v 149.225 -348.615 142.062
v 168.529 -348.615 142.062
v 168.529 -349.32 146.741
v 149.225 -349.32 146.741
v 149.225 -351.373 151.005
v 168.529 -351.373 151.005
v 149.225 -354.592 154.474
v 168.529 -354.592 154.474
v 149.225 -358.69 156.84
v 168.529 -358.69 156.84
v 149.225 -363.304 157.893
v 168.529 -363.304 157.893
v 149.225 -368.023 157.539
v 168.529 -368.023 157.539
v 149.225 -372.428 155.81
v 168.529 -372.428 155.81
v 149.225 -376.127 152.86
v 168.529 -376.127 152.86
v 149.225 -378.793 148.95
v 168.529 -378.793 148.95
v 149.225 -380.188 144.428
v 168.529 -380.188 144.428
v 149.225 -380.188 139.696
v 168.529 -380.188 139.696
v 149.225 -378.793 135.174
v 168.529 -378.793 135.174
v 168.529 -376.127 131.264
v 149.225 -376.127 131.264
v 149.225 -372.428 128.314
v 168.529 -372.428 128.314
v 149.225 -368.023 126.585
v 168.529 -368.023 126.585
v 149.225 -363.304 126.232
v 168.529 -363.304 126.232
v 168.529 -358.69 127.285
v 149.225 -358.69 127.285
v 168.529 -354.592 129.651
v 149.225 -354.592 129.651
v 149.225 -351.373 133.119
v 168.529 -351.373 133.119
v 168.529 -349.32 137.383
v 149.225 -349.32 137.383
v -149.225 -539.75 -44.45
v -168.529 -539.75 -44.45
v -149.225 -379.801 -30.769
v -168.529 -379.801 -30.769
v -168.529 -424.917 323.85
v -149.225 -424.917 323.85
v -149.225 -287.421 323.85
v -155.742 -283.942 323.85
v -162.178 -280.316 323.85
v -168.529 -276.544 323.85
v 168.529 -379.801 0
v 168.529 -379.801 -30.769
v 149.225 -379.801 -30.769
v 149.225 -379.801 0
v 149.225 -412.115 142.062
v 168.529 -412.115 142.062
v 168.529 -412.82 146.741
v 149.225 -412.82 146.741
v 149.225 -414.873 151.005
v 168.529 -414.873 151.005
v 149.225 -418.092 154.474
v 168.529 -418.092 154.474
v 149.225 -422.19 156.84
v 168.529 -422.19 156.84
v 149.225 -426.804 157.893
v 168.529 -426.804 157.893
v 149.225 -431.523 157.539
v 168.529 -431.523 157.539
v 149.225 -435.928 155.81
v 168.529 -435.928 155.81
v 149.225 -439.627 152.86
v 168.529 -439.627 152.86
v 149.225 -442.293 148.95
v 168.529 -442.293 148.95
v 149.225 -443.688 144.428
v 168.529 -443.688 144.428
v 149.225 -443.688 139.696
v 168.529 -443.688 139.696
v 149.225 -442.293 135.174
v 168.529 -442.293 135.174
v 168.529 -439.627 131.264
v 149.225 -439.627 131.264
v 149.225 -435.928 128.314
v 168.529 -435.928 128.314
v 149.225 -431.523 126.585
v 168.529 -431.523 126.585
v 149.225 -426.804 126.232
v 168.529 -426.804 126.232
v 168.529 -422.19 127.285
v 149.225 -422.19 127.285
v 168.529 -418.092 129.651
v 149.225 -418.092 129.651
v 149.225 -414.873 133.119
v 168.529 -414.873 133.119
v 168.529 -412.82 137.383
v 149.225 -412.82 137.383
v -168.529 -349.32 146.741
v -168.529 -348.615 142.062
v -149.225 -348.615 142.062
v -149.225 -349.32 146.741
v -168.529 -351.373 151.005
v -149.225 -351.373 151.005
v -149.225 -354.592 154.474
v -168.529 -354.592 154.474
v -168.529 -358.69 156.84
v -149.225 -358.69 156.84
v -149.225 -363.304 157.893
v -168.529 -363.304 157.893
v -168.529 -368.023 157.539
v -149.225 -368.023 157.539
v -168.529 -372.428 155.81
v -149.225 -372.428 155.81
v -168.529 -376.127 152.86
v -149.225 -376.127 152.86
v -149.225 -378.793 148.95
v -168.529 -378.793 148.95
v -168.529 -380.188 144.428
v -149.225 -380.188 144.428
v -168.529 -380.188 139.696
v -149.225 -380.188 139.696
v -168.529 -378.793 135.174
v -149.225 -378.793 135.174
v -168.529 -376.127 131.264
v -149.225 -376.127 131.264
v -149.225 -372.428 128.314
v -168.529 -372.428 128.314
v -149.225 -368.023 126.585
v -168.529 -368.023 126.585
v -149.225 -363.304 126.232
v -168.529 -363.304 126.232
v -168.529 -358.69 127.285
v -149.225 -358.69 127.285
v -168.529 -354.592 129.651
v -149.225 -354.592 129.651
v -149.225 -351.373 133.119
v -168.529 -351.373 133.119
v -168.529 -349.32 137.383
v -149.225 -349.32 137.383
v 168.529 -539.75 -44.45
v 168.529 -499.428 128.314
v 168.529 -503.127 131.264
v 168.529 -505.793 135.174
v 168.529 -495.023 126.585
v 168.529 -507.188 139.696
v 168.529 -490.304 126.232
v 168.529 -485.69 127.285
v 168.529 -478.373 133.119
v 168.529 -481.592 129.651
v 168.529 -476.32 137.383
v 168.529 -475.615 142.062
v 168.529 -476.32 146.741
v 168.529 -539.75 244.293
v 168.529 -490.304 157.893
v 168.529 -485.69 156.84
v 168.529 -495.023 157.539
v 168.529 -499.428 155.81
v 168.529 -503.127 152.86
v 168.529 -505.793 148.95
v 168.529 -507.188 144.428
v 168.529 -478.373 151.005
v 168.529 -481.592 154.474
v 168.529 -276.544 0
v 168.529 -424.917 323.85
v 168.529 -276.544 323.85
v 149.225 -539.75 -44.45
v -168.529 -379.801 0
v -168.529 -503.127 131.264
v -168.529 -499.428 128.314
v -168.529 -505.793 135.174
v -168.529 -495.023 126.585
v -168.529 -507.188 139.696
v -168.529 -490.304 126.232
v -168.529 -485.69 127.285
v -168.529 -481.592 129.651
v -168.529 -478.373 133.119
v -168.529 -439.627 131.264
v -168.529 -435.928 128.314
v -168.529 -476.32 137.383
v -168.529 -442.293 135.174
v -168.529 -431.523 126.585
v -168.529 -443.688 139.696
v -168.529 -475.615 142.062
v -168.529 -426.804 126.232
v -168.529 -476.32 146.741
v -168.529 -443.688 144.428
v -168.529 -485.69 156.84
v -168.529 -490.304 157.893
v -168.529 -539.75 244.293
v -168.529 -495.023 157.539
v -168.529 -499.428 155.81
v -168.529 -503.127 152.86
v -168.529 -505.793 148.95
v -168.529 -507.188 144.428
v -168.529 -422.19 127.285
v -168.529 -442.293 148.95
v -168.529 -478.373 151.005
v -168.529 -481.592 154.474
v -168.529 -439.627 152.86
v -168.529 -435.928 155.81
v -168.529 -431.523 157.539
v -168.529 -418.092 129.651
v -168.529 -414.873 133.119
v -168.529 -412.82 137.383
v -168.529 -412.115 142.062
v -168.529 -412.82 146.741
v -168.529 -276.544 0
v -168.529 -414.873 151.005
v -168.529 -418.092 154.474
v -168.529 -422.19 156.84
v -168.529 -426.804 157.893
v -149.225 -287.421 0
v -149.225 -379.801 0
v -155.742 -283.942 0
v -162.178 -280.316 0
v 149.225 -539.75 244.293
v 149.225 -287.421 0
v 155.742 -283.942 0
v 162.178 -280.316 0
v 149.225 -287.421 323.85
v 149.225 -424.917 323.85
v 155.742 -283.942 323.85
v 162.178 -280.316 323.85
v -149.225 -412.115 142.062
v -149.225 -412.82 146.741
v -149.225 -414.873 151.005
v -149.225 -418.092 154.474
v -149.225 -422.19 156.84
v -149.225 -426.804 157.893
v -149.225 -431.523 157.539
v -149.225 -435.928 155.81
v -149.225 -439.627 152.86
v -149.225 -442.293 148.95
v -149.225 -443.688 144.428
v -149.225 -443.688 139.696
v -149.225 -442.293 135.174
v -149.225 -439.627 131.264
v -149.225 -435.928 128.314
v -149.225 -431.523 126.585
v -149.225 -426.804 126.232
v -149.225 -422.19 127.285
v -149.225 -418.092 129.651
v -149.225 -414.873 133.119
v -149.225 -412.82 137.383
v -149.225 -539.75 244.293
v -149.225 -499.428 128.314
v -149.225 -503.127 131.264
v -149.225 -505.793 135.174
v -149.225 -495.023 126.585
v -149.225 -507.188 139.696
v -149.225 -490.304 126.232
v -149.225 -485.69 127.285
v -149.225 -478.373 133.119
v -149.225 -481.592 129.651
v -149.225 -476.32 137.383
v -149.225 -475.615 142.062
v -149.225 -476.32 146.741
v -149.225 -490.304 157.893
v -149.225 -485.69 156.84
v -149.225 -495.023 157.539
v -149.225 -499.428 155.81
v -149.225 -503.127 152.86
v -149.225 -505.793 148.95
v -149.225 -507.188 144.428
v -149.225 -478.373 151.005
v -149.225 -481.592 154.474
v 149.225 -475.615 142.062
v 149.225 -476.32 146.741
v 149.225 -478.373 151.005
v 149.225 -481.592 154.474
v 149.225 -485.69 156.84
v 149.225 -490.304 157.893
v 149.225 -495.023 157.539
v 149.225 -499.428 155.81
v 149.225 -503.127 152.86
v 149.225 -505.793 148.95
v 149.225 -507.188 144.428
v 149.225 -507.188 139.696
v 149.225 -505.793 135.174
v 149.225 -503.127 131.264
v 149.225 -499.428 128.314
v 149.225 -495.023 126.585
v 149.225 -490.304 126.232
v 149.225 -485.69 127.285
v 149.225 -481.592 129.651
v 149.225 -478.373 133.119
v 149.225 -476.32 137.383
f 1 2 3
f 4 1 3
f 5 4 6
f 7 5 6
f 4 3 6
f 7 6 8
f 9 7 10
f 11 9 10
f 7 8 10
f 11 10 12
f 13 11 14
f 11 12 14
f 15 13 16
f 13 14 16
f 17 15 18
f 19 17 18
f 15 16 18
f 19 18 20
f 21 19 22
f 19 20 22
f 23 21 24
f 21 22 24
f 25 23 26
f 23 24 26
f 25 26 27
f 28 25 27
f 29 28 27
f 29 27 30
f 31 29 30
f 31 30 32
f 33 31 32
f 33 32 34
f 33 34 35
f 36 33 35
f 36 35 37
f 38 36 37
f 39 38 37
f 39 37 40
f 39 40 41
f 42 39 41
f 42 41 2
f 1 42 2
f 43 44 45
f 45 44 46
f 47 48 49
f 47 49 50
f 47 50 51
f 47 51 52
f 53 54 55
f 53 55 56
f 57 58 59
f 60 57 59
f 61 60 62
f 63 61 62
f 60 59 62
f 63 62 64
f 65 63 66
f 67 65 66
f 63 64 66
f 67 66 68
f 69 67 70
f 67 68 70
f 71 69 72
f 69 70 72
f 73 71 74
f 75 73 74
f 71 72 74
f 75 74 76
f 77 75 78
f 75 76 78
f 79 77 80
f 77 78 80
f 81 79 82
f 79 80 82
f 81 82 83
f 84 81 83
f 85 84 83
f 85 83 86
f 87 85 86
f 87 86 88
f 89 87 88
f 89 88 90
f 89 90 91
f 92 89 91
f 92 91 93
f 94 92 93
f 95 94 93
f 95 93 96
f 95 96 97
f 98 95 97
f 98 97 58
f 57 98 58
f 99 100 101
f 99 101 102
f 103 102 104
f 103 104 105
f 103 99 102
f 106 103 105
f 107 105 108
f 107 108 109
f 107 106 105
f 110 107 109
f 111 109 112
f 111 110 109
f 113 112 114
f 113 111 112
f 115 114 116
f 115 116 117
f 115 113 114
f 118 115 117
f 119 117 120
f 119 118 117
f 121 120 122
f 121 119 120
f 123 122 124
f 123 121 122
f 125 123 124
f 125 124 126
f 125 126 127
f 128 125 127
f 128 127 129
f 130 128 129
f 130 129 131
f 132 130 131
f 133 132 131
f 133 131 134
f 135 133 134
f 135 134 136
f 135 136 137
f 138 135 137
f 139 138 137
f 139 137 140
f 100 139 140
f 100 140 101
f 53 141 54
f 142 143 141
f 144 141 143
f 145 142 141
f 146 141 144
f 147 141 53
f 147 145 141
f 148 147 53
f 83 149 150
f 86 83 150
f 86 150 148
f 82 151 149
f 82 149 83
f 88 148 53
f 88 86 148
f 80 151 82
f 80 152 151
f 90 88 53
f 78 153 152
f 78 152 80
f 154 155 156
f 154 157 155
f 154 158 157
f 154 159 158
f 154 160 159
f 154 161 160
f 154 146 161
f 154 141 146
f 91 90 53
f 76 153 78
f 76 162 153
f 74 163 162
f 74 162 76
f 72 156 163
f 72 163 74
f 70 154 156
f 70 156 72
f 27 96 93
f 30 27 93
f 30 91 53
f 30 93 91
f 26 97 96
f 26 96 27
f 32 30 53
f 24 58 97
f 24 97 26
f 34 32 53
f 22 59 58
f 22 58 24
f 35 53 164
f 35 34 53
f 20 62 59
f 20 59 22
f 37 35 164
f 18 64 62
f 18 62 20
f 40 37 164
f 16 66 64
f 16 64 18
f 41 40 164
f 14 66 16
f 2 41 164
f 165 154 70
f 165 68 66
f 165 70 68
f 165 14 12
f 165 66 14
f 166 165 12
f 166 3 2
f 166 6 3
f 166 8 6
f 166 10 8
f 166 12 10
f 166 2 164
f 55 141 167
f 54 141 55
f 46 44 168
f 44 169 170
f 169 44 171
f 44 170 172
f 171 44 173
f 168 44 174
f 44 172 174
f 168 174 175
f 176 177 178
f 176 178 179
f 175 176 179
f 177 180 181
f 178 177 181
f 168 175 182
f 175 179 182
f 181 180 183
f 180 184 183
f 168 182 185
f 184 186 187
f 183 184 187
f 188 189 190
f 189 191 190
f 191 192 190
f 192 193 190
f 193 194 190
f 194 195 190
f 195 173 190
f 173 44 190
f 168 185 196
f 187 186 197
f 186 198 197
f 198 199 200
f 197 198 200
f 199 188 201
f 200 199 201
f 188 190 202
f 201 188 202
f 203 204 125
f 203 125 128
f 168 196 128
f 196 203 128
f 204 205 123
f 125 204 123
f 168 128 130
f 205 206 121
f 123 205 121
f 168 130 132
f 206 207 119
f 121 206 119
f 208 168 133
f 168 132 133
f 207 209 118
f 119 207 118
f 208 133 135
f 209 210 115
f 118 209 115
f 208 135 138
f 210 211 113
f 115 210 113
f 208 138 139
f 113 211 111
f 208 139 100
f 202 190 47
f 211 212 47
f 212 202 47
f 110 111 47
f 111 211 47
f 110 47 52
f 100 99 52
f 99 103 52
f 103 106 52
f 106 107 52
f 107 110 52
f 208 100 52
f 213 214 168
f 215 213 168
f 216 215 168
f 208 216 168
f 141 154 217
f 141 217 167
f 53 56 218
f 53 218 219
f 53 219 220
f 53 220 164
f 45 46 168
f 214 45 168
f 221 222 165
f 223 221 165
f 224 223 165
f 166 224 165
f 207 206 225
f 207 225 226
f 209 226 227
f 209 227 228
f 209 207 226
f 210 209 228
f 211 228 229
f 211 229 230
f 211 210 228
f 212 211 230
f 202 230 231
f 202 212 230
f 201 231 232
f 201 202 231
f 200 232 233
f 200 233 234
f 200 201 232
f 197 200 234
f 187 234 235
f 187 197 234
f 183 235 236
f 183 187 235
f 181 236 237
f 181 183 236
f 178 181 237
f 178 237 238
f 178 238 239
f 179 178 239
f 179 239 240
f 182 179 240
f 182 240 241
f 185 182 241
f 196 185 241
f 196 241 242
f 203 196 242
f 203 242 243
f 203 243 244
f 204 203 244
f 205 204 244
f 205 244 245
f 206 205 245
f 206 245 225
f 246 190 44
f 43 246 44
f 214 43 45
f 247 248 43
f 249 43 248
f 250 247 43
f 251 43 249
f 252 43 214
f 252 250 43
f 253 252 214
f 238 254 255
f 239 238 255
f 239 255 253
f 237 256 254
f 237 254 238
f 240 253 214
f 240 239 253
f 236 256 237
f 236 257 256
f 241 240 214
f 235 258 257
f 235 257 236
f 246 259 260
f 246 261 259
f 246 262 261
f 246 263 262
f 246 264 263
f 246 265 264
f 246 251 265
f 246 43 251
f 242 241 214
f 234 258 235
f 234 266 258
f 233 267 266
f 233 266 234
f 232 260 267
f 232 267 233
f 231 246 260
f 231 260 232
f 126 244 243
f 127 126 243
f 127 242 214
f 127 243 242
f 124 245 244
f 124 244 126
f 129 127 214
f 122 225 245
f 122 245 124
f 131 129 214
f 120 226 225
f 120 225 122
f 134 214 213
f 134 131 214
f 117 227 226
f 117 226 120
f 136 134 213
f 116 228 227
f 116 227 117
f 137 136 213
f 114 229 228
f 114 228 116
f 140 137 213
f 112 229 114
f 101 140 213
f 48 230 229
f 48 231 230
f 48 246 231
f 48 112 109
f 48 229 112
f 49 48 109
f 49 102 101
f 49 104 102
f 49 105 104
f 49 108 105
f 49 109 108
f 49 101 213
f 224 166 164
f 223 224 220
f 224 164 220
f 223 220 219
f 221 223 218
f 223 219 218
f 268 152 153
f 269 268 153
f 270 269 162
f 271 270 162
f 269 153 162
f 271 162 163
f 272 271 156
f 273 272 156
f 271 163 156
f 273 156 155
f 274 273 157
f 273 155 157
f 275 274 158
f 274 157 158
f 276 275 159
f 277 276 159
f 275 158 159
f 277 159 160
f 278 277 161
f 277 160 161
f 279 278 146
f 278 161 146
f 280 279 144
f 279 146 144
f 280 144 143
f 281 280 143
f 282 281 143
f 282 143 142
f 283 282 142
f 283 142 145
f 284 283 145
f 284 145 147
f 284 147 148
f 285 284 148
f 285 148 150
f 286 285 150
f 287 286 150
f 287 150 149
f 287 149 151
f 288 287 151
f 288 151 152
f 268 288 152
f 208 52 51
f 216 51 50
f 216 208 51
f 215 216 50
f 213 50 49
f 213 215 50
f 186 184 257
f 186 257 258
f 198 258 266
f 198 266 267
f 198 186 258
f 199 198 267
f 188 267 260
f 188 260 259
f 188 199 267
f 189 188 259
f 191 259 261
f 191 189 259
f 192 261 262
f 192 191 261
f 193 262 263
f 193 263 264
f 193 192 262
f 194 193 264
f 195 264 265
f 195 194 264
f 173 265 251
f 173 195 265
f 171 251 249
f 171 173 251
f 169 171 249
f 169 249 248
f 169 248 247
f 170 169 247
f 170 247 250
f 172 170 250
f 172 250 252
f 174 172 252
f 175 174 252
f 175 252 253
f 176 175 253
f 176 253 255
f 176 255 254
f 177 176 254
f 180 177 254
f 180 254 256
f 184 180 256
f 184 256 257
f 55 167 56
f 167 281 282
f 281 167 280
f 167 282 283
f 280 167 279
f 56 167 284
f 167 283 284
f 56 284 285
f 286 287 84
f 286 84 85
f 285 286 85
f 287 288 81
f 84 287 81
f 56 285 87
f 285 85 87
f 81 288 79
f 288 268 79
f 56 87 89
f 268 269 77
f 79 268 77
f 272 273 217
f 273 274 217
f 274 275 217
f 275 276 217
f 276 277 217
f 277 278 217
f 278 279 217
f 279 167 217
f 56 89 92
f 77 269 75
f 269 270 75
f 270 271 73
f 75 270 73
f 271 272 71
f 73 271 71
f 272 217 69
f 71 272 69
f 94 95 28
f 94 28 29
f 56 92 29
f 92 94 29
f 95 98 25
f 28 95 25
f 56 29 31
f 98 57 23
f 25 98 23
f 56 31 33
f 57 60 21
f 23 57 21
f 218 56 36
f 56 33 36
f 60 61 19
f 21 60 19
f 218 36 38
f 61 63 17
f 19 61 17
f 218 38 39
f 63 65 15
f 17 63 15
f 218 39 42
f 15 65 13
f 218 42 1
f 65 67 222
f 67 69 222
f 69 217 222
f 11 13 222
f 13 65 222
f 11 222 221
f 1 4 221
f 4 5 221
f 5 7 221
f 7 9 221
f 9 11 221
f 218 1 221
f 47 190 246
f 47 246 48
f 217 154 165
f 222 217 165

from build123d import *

# Parameters (mm, degrees)
F1_DEPTH = 323.85
F3_DEPTH = 19.304
F4_R     = 15.875
F5_DEPTH = 83.566


with BuildPart() as f1:
    # F0 (on Top) → F1 (new body)
    with BuildSketch(Plane.XY):
        with BuildLine():
            Line((149.225, -287.42081), (149.225, -539.75))
            Line((149.225, -539.75), (168.529, -539.75))
            Line((168.529, -539.75), (168.529, -276.544388))
            ThreePointArc((168.529, -276.544388), (158.970045, -282.14774), (149.225, -287.42081))
        make_face()
    extrude(amount=F1_DEPTH)

    # F2 (on face) → F3 (join)
    with BuildSketch(Plane.YZ.offset(168.529)):
        Polygon((-379.800558, 0), (-539.75, 0), (-539.75, -44.45), (-379.800558, -30.7687), align=None)
    extrude(amount=-F3_DEPTH)

    # F4 (on face) → F5 (cut)
    with BuildSketch(Plane.YZ.offset(168.529)):
        Polygon((-424.9166, 323.85), (-539.75, 323.85), (-539.75, 244.292598), align=None)
        with Locations((-491.49, 142.0622)):
            Circle(F4_R)
        with Locations((-427.99, 142.0622)):
            Circle(F4_R)
        with Locations((-364.49, 142.0622)):
            Circle(F4_R)
    extrude(amount=-F5_DEPTH, mode=Mode.SUBTRACT)


with BuildPart() as f6_1:
    # F6: instance of F1
    add(f1.part.mirror(Plane.YZ))


solid = Compound([f1.part, f6_1.part])
